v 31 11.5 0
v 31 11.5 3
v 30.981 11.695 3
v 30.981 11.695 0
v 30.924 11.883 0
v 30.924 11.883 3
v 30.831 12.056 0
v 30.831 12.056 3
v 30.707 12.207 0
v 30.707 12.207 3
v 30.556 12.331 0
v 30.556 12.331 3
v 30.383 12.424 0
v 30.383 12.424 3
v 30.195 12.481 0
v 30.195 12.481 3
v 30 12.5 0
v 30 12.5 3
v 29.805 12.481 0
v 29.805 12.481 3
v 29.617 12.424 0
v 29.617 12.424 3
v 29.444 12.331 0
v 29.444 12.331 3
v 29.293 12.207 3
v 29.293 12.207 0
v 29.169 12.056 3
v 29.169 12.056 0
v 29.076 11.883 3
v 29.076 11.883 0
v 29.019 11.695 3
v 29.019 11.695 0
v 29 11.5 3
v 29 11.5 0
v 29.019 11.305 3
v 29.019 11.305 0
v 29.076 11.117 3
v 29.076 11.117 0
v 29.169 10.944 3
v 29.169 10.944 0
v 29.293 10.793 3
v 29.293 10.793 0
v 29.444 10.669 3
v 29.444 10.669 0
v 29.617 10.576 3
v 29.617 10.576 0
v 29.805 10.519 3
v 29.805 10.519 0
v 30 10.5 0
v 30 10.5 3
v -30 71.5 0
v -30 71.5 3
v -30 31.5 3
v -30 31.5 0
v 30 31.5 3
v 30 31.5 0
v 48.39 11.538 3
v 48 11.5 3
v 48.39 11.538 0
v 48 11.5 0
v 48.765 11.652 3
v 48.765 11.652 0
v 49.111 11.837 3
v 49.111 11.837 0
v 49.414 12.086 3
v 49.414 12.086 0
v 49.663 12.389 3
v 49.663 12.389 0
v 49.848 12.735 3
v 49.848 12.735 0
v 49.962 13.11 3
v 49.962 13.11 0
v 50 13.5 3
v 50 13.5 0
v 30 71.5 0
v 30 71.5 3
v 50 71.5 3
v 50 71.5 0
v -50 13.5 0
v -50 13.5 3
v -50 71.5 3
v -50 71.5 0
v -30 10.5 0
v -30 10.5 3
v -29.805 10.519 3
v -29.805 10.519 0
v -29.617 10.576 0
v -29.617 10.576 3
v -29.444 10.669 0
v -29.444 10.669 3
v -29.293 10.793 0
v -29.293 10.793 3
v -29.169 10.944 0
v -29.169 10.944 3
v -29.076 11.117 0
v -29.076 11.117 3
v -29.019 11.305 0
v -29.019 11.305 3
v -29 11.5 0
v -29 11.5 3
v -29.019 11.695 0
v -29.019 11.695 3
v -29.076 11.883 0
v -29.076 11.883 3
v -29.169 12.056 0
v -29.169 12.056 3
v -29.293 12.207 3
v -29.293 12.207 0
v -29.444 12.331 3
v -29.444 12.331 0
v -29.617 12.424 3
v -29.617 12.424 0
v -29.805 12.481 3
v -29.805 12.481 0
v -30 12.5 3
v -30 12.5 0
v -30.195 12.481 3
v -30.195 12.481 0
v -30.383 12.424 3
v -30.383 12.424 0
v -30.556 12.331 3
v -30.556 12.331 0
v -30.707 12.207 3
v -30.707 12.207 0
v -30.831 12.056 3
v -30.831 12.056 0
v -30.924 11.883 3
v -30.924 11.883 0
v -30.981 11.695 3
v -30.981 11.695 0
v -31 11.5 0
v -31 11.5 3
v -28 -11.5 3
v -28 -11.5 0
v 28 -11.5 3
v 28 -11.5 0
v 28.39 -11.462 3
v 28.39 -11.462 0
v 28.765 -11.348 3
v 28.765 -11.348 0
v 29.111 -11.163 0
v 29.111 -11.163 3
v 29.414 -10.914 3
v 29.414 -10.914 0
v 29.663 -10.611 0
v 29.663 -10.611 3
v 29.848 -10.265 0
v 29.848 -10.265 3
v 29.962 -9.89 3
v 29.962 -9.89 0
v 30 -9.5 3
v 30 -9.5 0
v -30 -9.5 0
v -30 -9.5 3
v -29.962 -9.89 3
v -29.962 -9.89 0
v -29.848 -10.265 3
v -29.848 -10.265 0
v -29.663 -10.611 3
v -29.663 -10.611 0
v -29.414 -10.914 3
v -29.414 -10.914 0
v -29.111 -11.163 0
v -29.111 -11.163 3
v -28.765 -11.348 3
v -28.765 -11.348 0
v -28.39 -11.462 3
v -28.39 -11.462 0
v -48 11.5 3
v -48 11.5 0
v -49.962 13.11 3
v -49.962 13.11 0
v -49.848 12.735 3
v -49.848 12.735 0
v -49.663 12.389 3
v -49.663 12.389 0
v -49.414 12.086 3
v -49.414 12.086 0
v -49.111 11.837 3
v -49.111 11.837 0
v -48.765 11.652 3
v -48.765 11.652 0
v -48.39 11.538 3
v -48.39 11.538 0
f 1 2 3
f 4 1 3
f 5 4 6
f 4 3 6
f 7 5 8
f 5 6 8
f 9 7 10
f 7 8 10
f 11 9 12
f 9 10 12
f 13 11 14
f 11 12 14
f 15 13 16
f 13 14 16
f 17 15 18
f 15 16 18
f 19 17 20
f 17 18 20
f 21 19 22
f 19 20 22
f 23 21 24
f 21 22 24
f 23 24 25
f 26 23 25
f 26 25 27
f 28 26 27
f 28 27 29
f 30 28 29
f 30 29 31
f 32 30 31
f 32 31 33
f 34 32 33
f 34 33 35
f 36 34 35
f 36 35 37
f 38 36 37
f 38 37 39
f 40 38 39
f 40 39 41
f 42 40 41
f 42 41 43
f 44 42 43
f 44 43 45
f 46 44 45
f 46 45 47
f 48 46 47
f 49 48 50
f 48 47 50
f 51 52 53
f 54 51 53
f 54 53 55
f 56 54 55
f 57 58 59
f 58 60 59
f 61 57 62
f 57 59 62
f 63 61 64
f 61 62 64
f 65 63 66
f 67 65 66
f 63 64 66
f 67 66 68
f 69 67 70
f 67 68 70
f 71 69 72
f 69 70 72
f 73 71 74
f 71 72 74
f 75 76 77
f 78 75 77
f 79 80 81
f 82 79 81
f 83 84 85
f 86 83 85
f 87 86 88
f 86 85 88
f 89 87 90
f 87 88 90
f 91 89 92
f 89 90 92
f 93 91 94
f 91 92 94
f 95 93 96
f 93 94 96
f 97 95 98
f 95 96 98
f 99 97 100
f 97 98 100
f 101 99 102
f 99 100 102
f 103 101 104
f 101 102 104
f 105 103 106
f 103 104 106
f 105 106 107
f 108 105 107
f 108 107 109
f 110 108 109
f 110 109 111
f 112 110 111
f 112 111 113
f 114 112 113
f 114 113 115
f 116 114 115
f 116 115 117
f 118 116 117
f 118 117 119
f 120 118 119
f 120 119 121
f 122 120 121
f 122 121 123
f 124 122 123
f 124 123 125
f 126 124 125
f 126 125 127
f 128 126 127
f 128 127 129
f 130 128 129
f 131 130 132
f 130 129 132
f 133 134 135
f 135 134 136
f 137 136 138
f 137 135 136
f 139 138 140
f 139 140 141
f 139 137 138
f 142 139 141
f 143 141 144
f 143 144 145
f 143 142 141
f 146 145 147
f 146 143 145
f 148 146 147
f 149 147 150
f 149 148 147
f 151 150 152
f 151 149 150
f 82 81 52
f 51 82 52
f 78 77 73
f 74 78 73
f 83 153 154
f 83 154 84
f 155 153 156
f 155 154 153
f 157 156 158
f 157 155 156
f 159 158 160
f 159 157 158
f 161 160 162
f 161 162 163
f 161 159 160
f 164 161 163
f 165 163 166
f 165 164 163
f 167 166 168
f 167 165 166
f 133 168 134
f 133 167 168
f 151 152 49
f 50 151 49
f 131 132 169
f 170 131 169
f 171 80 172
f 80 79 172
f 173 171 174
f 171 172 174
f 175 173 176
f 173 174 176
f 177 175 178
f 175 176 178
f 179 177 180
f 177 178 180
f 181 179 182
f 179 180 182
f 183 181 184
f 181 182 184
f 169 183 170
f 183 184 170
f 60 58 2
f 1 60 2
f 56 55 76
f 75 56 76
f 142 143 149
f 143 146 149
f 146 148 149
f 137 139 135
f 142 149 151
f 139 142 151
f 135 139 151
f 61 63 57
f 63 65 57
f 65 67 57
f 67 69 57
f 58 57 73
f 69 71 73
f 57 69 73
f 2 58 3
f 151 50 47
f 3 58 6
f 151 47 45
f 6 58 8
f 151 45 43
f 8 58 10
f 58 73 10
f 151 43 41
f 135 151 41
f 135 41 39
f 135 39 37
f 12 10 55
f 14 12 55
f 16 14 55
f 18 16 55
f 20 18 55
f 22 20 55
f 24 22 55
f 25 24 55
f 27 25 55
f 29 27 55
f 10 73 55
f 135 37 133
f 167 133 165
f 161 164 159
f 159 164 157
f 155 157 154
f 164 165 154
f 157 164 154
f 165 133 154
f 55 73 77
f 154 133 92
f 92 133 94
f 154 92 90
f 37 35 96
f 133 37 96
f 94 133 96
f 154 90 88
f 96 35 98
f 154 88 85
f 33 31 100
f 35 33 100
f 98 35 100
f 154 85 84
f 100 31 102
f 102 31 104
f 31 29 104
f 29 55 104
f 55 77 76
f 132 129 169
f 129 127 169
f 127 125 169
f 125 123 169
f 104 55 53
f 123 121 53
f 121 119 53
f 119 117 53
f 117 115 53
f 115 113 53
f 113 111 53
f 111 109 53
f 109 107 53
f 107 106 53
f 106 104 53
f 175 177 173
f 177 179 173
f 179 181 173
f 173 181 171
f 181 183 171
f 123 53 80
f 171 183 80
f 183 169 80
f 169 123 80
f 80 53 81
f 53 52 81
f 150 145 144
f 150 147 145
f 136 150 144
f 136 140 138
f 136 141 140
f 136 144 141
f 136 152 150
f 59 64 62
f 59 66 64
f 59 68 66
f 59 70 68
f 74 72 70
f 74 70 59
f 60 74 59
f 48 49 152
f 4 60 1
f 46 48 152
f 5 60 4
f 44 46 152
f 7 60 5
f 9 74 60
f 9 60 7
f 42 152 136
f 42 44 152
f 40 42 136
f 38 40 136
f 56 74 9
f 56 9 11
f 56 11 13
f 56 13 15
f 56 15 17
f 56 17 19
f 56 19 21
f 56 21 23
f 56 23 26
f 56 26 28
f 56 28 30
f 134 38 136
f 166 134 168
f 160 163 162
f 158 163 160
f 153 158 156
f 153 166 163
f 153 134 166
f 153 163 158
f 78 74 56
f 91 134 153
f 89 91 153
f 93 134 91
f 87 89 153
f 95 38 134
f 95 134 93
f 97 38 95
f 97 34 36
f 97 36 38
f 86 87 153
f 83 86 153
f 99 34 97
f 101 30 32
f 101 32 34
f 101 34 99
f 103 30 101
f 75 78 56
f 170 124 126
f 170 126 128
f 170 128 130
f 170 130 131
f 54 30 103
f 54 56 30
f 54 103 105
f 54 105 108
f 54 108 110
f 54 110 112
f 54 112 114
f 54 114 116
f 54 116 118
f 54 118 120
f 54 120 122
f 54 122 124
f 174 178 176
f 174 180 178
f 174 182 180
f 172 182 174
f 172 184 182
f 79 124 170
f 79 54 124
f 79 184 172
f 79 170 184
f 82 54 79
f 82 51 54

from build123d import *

# Parameters (mm, degrees)
SKETCH1_W           = 60
SKETCH1_H           = 23
BOSS_EXTRUDE1_DEPTH = 3
BOSS_EXTRUDE2_DEPTH = 3
SKETCH3_R           = 1
CUT_EXTRUDE1_DEPTH  = 88.299770905
FILLET1_R           = 2


with BuildPart() as part:
    # Sketch1 → Boss-Extrude1 (new body)
    with BuildSketch(Plane.XY):
        Rectangle(SKETCH1_W, SKETCH1_H)
    extrude(amount=BOSS_EXTRUDE1_DEPTH)

    # Sketch2 → Boss-Extrude2 (add)
    with BuildSketch(Plane.XY.offset(3)):
        Polygon((50, 11.5), (-50, 11.5), (-50, 71.5), (-30, 71.5), (-30, 31.5), (30, 31.5), (30, 71.5), (50, 71.5), align=None)
    extrude(amount=-BOSS_EXTRUDE2_DEPTH)

    # Sketch3 → Cut-Extrude1 (cut, through all)
    with BuildSketch(Plane.XY.offset(3)):
        with Locations((-30, 11.5)):
            Circle(SKETCH3_R)
        with Locations((30, 11.5)):
            Circle(SKETCH3_R)
    extrude(amount=-CUT_EXTRUDE1_DEPTH, mode=Mode.SUBTRACT)

    # Fillet1
    fillet1_edges = [part.edges().sort_by_distance(p)[0] for p in [
        (50, 11.5, 1.5),
        (-50, 11.5, 1.5),
        (30, -11.5, 1.5),
        (-30, -11.5, 1.5),
    ]]
    fillet(fillet1_edges, radius=FILLET1_R)


solid = part.part
